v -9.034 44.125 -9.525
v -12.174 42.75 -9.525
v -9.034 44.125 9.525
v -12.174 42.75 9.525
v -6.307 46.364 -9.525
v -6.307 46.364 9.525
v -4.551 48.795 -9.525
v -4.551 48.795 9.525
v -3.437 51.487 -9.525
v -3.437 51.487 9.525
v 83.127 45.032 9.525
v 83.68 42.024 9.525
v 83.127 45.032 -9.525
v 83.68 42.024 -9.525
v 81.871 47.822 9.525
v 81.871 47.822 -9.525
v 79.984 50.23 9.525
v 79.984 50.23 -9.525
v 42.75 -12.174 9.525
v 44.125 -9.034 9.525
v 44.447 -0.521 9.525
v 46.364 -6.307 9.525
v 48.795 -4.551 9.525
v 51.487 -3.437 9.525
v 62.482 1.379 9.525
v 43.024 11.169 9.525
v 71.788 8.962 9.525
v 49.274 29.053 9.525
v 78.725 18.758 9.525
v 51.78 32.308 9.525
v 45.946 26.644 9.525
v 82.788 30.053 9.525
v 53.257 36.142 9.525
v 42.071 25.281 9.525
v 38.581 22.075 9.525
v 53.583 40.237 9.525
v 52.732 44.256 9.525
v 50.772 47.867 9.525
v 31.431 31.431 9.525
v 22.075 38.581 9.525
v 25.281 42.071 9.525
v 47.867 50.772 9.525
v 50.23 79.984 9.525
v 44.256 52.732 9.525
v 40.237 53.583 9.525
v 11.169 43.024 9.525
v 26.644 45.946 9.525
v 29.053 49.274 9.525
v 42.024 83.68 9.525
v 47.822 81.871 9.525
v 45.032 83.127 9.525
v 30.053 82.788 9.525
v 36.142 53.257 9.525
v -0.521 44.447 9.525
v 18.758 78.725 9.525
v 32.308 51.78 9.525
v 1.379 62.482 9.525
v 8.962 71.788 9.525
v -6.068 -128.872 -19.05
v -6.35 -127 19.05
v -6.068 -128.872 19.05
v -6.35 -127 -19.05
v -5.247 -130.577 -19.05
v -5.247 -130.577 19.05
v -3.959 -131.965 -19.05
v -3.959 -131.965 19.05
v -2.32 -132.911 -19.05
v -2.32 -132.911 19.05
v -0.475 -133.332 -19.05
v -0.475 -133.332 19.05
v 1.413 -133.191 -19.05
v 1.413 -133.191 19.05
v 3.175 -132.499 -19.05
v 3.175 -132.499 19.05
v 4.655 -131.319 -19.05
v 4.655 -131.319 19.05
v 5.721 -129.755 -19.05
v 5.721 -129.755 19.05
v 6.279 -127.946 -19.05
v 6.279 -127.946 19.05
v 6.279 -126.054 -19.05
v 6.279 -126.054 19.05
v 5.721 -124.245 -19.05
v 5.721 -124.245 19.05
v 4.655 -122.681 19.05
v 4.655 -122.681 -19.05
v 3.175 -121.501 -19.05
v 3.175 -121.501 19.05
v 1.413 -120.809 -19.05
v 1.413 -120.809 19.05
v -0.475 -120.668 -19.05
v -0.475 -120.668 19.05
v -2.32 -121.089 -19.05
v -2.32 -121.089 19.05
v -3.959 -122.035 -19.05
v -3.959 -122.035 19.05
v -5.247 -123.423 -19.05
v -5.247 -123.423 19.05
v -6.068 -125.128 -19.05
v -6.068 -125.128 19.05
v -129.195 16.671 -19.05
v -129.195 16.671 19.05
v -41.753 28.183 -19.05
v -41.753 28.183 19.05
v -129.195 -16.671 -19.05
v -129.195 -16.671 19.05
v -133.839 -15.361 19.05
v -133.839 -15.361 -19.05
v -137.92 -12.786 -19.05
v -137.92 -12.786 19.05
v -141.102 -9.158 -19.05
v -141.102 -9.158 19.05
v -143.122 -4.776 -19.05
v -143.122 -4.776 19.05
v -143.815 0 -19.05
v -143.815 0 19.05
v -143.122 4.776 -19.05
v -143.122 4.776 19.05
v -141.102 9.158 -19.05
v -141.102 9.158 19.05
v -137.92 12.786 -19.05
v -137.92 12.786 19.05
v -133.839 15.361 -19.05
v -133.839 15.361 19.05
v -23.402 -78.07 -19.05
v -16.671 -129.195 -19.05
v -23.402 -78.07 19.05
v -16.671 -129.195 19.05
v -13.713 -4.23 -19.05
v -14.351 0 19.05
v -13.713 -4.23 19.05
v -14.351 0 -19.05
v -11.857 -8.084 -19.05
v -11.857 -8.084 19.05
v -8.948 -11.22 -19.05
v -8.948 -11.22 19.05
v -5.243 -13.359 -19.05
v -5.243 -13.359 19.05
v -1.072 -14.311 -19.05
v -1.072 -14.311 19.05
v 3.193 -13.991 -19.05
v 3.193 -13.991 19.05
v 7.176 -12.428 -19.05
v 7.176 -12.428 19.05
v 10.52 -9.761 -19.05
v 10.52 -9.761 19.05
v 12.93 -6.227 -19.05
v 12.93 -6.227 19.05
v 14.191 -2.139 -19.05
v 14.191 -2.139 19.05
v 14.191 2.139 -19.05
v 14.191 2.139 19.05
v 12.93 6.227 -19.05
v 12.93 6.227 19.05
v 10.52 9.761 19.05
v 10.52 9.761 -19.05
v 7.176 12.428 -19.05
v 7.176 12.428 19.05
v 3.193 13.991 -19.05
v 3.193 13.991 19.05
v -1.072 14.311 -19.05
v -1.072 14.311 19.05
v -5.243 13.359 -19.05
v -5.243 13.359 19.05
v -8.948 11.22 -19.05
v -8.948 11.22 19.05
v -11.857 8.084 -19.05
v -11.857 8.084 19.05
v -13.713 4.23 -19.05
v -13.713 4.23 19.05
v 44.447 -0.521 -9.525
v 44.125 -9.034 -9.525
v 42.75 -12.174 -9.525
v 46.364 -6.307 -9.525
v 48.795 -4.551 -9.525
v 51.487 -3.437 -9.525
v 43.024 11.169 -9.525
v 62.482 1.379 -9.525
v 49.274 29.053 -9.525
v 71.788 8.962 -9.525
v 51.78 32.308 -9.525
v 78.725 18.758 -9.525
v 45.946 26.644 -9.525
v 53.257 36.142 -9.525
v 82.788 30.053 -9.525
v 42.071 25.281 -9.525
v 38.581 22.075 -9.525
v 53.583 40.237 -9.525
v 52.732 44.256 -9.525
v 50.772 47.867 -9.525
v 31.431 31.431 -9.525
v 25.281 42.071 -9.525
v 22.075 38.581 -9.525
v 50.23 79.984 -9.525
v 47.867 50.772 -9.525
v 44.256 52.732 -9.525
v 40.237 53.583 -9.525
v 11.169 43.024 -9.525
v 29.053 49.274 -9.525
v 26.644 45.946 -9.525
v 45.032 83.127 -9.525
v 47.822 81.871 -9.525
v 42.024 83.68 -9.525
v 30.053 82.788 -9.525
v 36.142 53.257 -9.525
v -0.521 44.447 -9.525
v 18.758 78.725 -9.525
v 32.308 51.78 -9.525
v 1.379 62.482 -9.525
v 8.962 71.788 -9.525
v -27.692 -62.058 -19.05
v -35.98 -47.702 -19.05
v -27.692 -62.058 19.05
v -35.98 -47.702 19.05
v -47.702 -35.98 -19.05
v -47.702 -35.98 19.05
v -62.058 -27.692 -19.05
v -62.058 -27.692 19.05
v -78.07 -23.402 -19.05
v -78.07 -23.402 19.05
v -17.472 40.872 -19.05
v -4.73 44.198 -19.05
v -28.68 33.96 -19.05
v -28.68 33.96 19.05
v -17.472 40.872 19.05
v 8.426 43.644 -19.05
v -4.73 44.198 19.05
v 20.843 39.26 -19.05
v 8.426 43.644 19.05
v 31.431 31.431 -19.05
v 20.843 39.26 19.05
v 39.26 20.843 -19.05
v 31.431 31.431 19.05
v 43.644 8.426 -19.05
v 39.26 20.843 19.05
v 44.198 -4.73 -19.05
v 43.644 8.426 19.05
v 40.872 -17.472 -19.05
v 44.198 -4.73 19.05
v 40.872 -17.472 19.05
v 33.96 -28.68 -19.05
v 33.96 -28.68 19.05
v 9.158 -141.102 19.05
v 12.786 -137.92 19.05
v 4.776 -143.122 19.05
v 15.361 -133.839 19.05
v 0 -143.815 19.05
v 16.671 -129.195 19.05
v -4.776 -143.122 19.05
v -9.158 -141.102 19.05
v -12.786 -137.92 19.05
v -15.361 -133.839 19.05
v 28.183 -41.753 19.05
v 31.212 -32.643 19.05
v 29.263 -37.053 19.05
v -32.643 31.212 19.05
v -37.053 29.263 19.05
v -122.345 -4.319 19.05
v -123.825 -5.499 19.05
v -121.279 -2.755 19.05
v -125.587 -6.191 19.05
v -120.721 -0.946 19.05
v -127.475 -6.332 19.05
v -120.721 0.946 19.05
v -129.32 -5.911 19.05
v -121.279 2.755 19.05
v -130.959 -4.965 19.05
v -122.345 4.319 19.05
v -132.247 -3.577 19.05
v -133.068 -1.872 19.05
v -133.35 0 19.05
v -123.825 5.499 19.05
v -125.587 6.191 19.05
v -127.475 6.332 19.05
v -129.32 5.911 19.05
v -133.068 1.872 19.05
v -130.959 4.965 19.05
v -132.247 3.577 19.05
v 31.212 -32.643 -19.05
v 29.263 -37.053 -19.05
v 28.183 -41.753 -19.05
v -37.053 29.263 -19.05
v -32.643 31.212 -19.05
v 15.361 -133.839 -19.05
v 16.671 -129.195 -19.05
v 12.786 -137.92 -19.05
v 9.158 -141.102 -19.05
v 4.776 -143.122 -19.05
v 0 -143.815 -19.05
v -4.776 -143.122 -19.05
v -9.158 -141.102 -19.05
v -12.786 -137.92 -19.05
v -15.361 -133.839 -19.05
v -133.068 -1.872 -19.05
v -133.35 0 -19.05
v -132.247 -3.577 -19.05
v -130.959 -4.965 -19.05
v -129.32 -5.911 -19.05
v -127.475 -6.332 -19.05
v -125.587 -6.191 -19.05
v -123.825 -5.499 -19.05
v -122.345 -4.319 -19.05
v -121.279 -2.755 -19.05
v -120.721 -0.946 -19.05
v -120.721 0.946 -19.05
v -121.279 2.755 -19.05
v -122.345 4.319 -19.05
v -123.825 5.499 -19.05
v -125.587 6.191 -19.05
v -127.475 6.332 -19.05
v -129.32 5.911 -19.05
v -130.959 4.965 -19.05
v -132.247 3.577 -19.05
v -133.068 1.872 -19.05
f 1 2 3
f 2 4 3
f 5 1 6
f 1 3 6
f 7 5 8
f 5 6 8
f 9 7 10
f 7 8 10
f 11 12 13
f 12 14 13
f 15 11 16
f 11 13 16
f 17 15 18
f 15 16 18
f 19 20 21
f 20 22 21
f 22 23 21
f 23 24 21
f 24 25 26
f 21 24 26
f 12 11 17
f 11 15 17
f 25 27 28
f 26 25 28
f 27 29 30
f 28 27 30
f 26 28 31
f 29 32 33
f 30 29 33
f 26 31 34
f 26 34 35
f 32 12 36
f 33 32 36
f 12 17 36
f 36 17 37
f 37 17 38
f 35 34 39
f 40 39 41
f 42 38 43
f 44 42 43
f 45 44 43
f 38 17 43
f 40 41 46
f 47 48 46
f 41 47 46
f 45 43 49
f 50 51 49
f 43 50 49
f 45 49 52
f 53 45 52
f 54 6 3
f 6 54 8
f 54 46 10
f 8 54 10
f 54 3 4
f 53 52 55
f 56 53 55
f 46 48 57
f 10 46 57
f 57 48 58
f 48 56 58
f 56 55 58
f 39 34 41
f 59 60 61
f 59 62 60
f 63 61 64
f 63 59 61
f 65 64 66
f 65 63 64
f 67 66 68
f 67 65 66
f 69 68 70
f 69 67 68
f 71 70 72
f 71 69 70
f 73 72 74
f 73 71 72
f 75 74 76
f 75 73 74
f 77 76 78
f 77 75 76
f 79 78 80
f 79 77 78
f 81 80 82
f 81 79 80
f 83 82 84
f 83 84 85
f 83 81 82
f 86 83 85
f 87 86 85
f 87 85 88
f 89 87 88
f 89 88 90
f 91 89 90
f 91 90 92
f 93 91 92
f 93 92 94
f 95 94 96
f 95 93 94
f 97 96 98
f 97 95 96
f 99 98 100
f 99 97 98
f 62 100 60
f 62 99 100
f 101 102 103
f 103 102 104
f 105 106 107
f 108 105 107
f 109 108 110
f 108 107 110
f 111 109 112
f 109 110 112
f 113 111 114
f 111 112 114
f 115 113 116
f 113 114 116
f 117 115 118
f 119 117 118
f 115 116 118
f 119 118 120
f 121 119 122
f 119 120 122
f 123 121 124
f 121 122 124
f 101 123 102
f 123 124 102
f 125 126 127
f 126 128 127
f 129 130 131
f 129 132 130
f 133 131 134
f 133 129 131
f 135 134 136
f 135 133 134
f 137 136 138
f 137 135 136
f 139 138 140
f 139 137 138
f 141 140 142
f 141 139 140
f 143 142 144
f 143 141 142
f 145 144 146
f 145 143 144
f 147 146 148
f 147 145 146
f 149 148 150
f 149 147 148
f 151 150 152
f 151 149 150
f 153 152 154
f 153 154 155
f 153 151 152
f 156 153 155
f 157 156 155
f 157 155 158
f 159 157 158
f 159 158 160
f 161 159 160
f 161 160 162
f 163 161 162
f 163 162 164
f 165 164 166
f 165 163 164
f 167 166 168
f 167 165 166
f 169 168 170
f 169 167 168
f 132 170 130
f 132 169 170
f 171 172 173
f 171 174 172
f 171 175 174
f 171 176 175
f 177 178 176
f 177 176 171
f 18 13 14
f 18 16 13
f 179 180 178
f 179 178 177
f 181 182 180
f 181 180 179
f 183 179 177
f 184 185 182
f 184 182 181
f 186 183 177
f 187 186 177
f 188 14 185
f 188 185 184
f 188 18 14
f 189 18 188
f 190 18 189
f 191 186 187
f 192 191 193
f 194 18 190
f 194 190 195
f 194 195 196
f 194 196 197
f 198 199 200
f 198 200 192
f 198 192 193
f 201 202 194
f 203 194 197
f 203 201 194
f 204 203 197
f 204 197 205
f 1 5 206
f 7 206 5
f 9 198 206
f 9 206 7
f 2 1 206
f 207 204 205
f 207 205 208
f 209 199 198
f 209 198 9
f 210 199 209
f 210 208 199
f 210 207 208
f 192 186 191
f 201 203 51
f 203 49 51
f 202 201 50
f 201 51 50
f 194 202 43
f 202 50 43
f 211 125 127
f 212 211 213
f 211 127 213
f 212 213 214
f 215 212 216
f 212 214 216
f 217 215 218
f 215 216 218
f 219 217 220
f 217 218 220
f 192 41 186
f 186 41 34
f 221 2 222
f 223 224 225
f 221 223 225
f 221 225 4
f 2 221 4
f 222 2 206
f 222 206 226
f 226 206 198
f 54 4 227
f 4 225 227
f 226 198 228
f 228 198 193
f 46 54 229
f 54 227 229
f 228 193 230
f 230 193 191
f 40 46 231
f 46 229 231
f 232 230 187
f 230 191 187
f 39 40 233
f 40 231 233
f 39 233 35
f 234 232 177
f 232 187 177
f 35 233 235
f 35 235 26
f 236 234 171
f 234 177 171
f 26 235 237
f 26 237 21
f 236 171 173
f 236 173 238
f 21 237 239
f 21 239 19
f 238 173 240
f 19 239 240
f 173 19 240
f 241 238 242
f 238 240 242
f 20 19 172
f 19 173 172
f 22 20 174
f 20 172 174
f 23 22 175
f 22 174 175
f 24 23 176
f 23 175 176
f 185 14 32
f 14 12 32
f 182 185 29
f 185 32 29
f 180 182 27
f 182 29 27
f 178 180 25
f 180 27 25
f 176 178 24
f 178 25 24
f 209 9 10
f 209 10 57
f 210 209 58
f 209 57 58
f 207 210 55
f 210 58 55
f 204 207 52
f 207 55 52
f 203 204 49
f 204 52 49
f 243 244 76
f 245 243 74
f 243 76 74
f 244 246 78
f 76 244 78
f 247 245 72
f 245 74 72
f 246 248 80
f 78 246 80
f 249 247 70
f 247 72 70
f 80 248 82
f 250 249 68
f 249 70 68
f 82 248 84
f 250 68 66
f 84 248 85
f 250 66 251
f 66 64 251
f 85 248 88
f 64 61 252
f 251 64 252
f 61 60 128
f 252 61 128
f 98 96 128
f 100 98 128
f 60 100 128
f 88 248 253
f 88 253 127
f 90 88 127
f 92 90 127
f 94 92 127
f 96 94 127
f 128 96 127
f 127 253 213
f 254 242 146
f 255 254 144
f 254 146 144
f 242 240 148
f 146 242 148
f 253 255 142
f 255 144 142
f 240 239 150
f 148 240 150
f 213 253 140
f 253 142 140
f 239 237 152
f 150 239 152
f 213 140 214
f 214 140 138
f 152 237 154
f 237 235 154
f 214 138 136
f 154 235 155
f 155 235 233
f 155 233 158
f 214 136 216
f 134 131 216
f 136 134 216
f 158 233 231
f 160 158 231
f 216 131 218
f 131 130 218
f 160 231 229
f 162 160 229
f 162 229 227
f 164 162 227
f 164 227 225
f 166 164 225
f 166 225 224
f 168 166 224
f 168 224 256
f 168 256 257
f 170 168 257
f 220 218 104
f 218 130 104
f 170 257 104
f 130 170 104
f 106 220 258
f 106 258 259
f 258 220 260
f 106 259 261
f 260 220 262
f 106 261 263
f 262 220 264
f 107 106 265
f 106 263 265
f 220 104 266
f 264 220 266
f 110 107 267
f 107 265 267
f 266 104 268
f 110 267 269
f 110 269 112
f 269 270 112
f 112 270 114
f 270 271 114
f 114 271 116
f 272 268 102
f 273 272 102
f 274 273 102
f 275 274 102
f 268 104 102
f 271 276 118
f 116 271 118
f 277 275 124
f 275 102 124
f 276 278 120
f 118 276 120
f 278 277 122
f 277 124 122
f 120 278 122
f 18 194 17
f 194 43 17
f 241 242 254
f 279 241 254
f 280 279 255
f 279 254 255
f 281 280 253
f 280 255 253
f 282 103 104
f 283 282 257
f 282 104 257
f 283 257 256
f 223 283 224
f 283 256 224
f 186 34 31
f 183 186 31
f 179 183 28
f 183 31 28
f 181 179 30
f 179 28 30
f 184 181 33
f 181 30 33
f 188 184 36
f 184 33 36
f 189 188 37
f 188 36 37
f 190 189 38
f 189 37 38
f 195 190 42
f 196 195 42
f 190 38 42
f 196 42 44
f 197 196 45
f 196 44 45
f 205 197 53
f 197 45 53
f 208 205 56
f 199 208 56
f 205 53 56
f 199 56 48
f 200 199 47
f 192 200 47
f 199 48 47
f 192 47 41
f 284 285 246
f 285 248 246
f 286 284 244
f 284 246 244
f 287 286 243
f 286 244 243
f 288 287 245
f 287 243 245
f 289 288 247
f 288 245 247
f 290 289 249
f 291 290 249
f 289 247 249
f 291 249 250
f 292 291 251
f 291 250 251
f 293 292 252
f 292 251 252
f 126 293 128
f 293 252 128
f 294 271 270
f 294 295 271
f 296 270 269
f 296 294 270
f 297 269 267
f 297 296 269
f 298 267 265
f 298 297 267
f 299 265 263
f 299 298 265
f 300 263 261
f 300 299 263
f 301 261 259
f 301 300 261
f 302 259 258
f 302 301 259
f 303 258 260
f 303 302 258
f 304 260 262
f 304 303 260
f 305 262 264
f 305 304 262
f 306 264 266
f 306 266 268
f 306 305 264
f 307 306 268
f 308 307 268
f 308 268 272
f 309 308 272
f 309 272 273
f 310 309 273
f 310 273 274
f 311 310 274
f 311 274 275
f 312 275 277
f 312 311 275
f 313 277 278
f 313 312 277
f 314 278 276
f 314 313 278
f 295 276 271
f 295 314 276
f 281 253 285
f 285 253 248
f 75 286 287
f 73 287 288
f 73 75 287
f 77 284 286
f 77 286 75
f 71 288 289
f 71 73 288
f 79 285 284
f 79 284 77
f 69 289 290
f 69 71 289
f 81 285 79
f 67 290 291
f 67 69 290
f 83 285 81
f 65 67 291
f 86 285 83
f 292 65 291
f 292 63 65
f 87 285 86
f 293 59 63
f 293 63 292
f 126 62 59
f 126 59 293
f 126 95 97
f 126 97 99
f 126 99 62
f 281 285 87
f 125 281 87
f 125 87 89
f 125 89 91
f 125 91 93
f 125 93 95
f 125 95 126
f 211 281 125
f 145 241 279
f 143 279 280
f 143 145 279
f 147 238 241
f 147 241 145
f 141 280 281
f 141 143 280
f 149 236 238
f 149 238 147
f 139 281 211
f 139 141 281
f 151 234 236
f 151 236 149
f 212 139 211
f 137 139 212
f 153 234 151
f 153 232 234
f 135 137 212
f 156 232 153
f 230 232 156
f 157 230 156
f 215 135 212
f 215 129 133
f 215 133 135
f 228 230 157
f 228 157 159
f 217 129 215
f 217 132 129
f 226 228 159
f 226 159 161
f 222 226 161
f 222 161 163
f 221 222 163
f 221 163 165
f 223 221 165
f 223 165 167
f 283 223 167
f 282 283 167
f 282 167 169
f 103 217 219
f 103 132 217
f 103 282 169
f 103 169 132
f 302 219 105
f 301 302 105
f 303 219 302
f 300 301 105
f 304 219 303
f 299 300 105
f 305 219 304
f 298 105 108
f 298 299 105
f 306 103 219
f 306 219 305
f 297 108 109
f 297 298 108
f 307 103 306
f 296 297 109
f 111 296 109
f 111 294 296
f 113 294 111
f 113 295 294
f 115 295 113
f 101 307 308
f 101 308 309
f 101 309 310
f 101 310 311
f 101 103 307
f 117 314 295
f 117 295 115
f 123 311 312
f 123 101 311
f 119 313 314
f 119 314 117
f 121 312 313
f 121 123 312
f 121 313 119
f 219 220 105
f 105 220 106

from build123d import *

# Parameters (mm, degrees)
SKETCH1_R           = 6.35
SKETCH1_R_2         = 14.351
BOSS_EXTRUDE2_DEPTH = 19.05
BOSS_EXTRUDE3_DEPTH = 9.525
FILLET1_R           = 12.7


with BuildPart() as part:
    # Sketch1 → Boss-Extrude2 (new, symmetric)
    with BuildSketch(Plane.XY):
        with BuildLine():
            ThreePointArc((33.959932382, -28.67970524), (30.132939696, -34.801505964), (28.182908549, -41.752742952))
            Line((28.182908549, -41.752742952), (16.670947055, -129.194771817))
            ThreePointArc((16.670947055, -129.194771817), (0, -143.8148), (-16.670947055, -129.194771817))
            Line((-16.670947055, -129.194771817), (-23.40165253, -78.069988022))
            ThreePointArc((-23.40165253, -78.069988022), (-41.457120622, -41.457120622), (-78.069988022, -23.40165253))
            Line((-78.069988022, -23.40165253), (-129.194771817, -16.670947055))
            ThreePointArc((-129.194771817, -16.670947055), (-143.8148, 0), (-129.194771817, 16.670947055))
            Line((-129.194771817, 16.670947055), (-41.752742952, 28.182908549))
            ThreePointArc((-41.752742952, 28.182908549), (-34.801505964, 30.132939696), (-28.67970524, 33.959932382))
            ThreePointArc((-28.67970524, 33.959932382), (31.430896424, 31.430896424), (33.959932382, -28.67970524))
        make_face()
        with Locations(Location((0, -127, 0), (0, 0, 180))):
            Circle(SKETCH1_R, mode=Mode.SUBTRACT)
        with Locations(Location((-127, 0, 0), (0, 0, 180))):
            Circle(SKETCH1_R, mode=Mode.SUBTRACT)
        with Locations(Location((0, 0, 0), (0, 0, 180))):
            Circle(SKETCH1_R_2, mode=Mode.SUBTRACT)
    extrude(amount=BOSS_EXTRUDE2_DEPTH, both=True)

    # Sketch3 → Boss-Extrude3 (add, symmetric)
    with BuildSketch(Plane.XY):
        with BuildLine():
            Line((47.146344636, 83.06736912), (83.06736912, 47.146344636))
            ThreePointArc((83.06736912, 47.146344636), (74.914696381, 12.698674104), (44.182474556, -4.869439613))
            ThreePointArc((44.182474556, -4.869439613), (31.430896424, 31.430896424), (-4.869439613, 44.182474556))
            ThreePointArc((-4.869439613, 44.182474556), (12.698674104, 74.914696381), (47.146344636, 83.06736912))
        make_face()
        with BuildLine():
            Line((25.281244781, 42.070676127), (42.070676127, 25.281244781))
            ThreePointArc((42.070676127, 25.281244781), (49.424803335, 49.424803335), (25.281244781, 42.070676127))
        make_face(mode=Mode.SUBTRACT)
    extrude(amount=BOSS_EXTRUDE3_DEPTH, both=True)

    # Fillet1
    fillet1_edges = [part.edges().sort_by_distance(p)[0] for p in [
        (47.146344636, 83.06736912, 0),
        (-4.869439613, 44.182474556, 0),
        (44.182474556, -4.869439613, 0),
        (83.06736912, 47.146344636, 0),
    ]]
    fillet(fillet1_edges, radius=FILLET1_R)


solid = part.part
